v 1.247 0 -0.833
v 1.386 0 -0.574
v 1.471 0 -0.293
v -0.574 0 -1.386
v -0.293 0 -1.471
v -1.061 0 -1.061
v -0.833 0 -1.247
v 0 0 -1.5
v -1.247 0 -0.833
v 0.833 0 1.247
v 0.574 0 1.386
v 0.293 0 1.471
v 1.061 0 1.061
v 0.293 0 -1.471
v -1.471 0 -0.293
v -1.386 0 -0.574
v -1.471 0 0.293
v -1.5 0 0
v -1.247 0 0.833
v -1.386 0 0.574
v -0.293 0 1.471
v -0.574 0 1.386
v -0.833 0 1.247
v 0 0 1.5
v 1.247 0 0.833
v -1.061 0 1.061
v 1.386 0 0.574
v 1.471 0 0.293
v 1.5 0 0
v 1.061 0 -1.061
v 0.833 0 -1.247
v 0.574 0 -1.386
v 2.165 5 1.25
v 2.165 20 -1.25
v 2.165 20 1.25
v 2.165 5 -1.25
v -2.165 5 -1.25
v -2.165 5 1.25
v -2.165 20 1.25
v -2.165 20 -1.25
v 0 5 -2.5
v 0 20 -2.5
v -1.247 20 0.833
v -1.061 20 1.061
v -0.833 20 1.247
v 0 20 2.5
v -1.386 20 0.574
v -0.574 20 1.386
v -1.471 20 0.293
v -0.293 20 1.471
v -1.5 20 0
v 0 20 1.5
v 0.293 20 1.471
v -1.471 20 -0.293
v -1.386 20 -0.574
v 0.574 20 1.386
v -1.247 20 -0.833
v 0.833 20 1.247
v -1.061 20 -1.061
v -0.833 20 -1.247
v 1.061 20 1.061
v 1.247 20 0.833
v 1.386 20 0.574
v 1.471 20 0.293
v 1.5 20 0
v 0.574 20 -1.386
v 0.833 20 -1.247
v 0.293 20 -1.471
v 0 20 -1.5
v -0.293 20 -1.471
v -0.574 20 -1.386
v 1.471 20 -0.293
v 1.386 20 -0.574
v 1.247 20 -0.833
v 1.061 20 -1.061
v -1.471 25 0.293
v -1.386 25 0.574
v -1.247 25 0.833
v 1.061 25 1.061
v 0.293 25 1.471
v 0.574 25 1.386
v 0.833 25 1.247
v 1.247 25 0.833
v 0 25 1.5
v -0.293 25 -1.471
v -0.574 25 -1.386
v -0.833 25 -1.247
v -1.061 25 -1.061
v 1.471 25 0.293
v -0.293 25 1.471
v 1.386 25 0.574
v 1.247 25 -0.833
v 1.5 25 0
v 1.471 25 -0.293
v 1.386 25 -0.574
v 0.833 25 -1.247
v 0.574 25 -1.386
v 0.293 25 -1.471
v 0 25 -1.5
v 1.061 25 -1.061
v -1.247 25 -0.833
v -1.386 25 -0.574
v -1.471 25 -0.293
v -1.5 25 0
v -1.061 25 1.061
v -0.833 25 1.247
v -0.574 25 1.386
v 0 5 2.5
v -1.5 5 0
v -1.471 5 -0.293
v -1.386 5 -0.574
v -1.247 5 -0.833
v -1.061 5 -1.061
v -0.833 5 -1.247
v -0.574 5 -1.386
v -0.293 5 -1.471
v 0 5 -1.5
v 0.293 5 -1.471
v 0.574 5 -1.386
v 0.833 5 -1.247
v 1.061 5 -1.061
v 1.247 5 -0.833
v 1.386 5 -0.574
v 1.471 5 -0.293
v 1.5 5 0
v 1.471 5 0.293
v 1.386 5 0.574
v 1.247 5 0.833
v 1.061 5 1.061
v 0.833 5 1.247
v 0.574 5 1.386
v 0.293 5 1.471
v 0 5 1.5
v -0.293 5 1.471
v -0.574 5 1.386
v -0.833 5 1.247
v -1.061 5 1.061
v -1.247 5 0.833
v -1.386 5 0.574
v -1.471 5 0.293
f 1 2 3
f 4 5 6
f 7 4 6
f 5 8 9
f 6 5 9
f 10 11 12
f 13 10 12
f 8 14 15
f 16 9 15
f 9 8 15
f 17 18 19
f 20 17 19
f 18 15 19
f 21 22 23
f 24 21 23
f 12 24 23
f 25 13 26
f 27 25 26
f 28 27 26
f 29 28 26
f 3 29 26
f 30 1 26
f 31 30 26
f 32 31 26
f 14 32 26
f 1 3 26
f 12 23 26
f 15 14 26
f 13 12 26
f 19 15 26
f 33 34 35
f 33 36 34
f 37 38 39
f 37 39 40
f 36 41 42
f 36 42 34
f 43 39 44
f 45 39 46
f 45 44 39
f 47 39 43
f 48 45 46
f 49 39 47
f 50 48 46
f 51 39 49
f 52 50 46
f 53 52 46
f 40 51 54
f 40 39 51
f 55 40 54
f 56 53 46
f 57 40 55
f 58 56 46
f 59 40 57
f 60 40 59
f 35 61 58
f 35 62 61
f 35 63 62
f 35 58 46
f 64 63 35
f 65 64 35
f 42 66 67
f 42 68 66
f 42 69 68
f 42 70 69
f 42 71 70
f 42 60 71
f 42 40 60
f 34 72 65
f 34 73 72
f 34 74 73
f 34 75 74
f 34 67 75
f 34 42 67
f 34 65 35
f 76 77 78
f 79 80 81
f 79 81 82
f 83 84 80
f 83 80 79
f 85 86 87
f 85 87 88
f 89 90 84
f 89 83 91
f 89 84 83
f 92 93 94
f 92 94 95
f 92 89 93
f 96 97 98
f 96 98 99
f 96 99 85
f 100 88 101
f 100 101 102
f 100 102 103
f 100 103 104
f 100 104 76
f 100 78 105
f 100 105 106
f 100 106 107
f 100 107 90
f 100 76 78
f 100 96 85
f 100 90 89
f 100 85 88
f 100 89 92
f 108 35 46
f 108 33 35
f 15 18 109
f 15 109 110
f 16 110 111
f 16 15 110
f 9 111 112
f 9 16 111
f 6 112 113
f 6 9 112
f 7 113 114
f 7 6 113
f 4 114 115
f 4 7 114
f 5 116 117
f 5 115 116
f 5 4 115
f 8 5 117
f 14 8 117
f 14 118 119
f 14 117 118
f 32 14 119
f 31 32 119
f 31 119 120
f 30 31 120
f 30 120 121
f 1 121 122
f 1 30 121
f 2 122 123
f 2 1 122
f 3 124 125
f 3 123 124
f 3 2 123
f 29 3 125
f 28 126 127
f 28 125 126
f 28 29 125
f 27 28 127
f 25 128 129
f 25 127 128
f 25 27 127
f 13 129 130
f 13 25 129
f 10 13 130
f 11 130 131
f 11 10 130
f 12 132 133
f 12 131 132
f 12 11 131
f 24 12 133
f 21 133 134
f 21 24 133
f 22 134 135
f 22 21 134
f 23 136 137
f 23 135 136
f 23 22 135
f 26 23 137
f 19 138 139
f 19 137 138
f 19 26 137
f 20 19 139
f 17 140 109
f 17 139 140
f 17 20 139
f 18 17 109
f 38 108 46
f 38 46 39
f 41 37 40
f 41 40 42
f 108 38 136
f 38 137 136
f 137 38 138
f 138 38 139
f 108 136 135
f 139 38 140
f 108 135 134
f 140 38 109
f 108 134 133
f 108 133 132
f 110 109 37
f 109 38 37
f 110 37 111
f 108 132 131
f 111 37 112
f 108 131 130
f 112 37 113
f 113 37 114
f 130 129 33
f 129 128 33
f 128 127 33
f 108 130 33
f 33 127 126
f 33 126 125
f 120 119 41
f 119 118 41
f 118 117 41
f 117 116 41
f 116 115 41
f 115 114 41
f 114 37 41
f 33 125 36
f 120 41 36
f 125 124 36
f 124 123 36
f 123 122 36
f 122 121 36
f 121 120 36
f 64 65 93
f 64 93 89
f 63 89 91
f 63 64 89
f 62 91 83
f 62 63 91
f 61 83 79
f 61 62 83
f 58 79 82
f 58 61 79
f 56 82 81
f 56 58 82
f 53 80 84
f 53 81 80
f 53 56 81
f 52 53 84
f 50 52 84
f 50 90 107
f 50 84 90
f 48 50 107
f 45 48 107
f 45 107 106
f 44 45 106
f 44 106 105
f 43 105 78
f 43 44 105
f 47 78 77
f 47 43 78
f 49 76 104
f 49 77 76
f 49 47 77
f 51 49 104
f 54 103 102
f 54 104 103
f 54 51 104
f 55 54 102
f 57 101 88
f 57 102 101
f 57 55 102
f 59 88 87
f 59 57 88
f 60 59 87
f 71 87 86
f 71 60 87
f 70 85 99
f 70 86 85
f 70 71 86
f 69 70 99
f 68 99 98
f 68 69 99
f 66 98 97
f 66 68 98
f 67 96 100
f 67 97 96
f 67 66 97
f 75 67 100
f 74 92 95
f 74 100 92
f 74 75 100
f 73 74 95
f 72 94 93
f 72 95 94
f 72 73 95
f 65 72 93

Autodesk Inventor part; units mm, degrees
ref_plane "YZ Plane" through (0, 0, 0) normal (1, 0, 0) x (0, 1, 0)
ref_plane "XZ Plane" through (0, 0, 0) normal (0, 1, 0) x (-1, 0, 0)
ref_plane "XY Plane" through (0, 0, 0) normal (0, 0, 1) x (1, 0, 0)
sketch "Sketch1" plane through (0, 0, 0) normal (0, 1, 0) x (-1, 0, 0)
  circle A0 centre (0, 0) radius 1.5
  dimension "d0" = 3
extrude "Extrusion1" add sketch "Sketch1" along normal blind 5
sketch "Sketch2" plane through (0, 5, 0) normal (0, 1, 0) x (1, 0, 0)
  circle A0 centre (0, 0) radius 1.5 projected
  circle A1 centre (0, 0) radius 2.5
  line L0 (0, 2.5) -> (2.1651, 1.25)
  line L1 (2.1651, 1.25) -> (2.1651, -1.25)
  line L2 (2.1651, -1.25) -> (0, -2.5)
  line L3 (0, -2.5) -> (-2.1651, -1.25)
  line L4 (-2.1651, -1.25) -> (-2.1651, 1.25)
  line L5 (-2.1651, 1.25) -> (0, 2.5)
  dimension "d5" = 5
extrude "Extrusion2" add sketch "Sketch2" along normal blind 15 contours A0 | L1 L2 L3 L4 L5 L0
sketch "Sketch3" plane through (0, 20, 0) normal (0, 1, 0) x (1, 0, 0)
  circle A0 centre (0, 0) radius 1.5
  dimension "d8" = 3
extrude "Extrusion3" add sketch "Sketch3" along normal blind 5
thread "Thread1" size "M3x0.5" class "6g" standard "ANSI Metric M Profile" full length
thread "Thread2" size "M3x0.5" class "6g" standard "ANSI Metric M Profile" full length
properties part number "Heatbed_Standoff" material "Stainless Steel"
